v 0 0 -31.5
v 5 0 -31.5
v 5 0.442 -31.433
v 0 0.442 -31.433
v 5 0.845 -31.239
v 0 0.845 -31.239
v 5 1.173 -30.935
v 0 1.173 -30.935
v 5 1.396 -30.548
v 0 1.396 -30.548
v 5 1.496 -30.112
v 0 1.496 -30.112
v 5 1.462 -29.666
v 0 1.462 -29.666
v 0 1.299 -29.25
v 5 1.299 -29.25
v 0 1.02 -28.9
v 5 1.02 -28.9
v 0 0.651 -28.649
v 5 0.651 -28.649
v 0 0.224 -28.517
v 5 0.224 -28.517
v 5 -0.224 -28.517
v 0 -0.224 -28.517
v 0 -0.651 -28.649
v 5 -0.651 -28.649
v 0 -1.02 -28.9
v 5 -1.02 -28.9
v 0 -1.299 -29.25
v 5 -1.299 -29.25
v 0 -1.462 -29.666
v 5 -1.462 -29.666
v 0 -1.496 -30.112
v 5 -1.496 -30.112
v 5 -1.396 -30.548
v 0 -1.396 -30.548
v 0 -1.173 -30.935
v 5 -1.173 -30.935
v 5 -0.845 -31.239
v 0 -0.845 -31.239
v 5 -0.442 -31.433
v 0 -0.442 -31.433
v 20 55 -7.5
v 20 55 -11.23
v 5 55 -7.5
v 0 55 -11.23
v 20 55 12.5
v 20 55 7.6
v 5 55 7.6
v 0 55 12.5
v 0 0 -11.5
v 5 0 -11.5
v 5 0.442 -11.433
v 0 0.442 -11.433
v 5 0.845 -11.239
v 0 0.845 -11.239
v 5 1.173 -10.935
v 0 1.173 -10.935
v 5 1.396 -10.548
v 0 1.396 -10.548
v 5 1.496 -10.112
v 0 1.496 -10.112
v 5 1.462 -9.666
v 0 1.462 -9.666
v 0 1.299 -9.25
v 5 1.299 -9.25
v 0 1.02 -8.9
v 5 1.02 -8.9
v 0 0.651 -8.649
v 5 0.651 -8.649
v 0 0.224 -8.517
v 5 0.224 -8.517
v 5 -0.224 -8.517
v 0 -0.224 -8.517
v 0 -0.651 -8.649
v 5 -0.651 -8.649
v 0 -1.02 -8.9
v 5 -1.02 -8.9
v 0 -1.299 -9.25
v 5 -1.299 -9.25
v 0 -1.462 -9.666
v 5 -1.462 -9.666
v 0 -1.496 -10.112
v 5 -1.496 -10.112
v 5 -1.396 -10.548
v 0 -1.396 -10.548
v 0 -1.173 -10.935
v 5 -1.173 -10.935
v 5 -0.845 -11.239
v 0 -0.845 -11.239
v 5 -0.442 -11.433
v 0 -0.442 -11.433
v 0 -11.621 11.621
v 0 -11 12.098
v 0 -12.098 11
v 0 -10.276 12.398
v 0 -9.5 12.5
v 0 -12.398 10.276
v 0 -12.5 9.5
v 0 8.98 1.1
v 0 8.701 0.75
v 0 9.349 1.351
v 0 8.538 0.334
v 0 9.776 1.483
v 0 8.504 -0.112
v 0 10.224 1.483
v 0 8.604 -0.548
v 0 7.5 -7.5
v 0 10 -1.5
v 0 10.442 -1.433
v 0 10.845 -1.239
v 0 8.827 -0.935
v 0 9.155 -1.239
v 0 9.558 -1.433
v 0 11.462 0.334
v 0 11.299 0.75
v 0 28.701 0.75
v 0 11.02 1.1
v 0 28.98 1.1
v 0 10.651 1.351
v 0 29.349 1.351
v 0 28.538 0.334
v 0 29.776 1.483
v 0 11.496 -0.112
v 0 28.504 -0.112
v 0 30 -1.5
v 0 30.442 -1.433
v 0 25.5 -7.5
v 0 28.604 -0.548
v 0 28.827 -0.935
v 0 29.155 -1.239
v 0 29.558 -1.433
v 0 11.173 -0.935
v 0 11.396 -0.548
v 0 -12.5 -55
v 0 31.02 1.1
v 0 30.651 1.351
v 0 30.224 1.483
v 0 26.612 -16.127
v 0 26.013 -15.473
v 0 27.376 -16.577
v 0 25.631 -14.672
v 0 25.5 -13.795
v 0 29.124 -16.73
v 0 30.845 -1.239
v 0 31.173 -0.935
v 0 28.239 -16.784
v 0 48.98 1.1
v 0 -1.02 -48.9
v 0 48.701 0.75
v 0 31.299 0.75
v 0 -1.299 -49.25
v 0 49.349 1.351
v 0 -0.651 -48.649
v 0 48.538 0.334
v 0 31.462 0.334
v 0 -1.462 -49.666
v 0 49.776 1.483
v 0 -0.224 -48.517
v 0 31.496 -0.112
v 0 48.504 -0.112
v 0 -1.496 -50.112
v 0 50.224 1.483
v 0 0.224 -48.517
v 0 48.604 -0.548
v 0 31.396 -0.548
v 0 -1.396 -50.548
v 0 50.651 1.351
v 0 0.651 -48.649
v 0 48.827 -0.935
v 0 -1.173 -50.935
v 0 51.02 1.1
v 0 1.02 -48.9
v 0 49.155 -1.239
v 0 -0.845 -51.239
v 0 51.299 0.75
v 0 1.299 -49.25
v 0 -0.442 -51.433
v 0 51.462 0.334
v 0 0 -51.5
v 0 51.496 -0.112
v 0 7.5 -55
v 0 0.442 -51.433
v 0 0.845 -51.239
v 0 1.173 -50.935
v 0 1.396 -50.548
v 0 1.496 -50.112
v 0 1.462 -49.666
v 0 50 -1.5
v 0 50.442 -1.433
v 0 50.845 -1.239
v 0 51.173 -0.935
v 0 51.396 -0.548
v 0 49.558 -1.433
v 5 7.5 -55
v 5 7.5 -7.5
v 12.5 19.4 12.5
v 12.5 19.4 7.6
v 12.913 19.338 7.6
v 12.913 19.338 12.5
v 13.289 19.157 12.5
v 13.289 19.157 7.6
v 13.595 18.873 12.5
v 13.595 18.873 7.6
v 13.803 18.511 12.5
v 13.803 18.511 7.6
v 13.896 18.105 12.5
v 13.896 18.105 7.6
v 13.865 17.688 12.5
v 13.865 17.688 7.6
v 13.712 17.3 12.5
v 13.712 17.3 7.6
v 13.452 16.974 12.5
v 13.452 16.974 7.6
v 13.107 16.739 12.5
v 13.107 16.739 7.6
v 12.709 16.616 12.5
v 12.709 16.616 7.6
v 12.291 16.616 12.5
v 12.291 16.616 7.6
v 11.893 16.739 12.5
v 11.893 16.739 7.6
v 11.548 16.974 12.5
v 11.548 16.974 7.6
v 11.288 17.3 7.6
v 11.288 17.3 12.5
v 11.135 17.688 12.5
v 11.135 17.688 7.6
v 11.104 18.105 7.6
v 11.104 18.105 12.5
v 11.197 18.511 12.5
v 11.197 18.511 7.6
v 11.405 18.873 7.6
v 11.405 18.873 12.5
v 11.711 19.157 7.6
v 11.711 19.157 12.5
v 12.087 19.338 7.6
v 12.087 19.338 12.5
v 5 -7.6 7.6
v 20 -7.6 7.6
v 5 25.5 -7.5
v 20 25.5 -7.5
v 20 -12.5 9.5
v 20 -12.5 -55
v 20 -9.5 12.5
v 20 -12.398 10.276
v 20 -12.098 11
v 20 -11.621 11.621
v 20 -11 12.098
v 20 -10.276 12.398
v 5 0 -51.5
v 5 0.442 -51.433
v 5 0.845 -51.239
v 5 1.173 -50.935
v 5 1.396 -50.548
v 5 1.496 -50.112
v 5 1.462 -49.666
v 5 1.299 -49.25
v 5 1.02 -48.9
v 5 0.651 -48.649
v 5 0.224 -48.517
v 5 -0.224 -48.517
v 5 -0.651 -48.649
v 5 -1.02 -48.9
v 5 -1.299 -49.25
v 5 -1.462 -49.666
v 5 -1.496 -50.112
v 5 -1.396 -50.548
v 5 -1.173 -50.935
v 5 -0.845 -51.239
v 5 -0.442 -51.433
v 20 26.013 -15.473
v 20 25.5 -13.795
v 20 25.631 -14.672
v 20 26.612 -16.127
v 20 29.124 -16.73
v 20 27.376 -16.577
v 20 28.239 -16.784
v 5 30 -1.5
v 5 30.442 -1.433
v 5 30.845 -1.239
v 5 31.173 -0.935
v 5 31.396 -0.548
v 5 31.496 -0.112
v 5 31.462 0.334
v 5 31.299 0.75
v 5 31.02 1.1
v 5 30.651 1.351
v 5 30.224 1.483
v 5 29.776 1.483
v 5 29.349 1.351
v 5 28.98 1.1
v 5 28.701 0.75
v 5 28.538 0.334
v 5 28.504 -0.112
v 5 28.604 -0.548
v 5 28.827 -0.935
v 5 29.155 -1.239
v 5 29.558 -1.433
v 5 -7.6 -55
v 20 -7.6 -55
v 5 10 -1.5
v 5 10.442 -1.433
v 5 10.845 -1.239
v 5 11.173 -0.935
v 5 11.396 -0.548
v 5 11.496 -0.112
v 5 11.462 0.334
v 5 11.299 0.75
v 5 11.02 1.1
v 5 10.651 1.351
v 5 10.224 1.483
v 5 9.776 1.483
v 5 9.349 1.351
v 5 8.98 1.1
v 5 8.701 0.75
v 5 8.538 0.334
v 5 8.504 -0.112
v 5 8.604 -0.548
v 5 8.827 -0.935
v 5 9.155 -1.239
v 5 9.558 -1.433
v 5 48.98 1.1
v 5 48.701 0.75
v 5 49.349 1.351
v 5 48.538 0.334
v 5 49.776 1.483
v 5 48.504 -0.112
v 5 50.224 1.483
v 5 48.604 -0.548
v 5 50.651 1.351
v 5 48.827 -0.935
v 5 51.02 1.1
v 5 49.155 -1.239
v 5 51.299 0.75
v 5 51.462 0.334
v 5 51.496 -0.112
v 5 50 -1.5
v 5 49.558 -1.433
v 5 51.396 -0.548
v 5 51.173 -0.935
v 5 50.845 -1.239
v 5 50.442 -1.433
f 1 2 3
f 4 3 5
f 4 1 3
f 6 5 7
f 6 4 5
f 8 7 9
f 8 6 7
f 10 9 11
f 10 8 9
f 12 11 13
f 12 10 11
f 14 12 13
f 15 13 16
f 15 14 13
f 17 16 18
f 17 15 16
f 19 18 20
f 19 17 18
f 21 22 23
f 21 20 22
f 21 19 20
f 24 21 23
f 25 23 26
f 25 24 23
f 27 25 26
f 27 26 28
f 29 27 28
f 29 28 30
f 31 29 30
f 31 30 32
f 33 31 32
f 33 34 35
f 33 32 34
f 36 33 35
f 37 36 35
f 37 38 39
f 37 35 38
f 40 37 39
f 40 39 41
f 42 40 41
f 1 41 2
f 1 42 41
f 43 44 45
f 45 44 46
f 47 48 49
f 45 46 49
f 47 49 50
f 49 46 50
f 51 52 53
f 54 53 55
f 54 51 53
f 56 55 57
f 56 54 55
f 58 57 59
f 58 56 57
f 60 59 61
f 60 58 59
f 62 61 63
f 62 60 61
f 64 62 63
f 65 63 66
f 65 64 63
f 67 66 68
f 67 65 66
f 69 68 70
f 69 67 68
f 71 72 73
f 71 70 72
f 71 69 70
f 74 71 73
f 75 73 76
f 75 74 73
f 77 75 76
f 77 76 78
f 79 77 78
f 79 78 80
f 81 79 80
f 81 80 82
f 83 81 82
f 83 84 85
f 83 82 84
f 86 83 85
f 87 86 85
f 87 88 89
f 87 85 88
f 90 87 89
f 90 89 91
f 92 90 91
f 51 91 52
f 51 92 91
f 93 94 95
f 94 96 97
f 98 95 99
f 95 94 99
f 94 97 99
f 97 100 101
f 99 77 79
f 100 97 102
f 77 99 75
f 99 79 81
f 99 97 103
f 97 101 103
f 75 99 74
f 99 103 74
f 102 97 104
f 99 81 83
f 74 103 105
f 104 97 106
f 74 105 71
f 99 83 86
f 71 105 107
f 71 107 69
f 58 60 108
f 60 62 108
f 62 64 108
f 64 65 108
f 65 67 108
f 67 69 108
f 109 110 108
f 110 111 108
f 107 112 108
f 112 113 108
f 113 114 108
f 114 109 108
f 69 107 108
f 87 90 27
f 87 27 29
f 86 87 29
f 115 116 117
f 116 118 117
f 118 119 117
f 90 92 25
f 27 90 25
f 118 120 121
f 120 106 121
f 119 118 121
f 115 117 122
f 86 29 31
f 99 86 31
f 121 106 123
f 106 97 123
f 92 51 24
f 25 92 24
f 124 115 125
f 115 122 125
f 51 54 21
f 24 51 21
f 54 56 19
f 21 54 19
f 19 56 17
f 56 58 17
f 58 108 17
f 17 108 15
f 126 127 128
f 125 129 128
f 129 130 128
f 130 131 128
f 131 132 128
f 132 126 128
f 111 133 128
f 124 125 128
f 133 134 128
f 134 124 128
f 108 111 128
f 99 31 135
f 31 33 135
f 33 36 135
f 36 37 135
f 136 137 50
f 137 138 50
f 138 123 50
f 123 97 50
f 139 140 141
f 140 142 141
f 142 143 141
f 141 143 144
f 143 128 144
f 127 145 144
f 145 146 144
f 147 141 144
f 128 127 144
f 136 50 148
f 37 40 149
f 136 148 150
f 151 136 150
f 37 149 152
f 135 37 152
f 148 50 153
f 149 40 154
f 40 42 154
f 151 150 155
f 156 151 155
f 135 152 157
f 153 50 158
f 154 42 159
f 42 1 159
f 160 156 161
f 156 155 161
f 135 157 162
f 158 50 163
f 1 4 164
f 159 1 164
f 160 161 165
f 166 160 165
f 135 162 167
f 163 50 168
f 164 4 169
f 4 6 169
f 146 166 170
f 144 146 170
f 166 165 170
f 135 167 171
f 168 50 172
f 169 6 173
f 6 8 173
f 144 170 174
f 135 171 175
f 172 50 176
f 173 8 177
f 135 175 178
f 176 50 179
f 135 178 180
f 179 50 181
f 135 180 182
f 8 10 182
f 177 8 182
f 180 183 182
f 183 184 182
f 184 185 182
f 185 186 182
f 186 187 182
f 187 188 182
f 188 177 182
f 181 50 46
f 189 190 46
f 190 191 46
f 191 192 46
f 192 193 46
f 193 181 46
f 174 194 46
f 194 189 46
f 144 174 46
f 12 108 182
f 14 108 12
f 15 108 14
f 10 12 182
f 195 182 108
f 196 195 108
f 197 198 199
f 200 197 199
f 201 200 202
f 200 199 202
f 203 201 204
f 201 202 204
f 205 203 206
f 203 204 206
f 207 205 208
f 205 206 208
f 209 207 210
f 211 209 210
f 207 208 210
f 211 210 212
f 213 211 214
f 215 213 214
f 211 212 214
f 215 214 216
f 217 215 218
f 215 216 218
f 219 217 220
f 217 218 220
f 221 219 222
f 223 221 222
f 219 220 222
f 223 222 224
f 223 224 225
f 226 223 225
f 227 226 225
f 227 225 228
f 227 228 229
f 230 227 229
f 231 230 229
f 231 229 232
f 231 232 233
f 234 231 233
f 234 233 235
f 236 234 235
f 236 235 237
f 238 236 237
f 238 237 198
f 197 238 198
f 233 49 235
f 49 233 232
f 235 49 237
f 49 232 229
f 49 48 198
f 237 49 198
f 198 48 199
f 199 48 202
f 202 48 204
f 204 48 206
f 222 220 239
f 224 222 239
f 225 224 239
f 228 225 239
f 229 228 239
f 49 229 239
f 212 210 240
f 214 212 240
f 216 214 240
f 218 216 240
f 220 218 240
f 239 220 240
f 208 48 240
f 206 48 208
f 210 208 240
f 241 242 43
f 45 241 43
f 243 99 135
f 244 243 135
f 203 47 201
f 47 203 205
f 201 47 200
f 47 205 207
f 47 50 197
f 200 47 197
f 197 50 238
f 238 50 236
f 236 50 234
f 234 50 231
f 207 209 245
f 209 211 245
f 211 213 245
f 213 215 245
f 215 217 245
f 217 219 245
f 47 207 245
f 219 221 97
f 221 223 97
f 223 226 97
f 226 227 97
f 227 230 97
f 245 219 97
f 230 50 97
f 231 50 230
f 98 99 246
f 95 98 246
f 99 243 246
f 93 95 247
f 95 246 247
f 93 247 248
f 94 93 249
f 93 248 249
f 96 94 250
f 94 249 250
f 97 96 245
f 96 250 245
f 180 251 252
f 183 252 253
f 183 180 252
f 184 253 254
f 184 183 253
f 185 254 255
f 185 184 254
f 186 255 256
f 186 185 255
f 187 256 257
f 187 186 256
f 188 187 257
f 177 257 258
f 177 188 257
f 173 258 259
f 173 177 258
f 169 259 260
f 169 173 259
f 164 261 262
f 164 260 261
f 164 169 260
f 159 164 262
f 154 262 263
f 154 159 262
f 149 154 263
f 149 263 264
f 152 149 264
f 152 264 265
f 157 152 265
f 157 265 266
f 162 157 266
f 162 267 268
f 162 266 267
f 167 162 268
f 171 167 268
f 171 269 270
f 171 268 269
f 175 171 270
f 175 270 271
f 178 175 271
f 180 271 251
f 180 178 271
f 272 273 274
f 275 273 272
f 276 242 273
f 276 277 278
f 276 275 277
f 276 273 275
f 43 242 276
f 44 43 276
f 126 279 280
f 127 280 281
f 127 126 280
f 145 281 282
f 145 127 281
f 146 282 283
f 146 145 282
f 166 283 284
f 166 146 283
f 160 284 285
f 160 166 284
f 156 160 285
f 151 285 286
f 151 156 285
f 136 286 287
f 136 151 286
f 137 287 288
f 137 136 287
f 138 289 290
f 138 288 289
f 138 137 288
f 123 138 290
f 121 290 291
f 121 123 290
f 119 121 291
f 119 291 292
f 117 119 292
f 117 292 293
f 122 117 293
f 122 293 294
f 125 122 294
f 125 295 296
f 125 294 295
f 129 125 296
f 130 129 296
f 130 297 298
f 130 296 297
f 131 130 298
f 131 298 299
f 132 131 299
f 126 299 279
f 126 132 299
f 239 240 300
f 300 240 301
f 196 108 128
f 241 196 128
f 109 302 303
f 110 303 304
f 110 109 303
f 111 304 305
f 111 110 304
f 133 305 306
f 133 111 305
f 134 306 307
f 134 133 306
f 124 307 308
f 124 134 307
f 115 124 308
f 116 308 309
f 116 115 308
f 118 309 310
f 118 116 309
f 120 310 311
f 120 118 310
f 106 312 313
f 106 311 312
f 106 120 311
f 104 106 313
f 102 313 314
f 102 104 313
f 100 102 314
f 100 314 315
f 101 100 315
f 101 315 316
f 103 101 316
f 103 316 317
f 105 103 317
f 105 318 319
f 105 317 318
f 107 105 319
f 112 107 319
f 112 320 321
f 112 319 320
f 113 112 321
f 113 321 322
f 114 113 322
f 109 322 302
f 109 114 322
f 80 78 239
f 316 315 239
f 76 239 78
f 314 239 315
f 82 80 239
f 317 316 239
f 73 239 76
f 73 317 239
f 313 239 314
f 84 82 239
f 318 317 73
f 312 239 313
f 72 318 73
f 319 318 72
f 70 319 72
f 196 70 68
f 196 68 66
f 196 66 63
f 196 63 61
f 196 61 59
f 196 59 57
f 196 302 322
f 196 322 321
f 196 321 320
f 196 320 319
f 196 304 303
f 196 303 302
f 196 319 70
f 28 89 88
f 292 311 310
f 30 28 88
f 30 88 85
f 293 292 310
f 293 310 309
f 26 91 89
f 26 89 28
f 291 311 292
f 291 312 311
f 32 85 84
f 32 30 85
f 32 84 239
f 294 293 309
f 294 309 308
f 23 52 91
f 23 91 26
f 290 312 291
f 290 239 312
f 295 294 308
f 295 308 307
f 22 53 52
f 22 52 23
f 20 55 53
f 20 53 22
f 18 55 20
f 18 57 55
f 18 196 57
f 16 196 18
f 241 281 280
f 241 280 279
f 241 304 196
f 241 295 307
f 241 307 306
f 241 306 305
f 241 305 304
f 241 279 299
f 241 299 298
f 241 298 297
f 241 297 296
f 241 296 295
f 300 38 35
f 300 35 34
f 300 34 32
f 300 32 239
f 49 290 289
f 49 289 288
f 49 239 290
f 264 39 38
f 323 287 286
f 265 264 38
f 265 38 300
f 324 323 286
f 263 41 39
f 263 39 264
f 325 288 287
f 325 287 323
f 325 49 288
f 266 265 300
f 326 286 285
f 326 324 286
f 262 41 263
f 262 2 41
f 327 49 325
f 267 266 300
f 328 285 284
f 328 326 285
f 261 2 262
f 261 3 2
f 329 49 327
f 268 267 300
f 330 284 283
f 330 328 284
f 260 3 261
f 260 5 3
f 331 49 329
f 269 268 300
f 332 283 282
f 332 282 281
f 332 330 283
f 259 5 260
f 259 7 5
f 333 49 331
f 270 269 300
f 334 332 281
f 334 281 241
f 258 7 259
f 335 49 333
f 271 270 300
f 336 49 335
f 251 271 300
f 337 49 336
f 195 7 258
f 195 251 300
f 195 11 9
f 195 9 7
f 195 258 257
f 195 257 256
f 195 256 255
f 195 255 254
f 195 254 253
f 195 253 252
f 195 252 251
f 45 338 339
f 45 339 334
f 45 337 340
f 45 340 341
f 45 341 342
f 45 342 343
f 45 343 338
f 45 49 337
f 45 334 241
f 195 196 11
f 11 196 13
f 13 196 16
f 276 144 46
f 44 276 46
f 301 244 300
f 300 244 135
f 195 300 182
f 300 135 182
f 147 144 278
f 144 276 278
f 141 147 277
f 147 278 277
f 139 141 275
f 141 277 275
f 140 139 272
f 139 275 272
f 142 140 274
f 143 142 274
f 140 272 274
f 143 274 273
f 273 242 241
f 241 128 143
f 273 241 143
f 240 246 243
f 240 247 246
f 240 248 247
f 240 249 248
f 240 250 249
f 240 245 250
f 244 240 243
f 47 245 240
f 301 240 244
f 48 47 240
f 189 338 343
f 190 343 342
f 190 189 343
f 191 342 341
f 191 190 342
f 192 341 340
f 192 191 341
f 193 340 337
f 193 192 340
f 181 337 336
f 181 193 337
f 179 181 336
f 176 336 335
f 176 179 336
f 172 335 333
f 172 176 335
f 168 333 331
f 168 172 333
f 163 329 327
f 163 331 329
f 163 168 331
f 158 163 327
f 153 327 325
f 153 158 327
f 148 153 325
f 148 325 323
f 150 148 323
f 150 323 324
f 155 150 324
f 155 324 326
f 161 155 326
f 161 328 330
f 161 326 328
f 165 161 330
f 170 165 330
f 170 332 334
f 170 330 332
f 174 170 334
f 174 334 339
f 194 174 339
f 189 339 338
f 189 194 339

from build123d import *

# Parameters (mm, degrees)
SKETCH_1_R          = 1.5
EXTRUDE_1_DEPTH     = 20
CUT_EXTRUDE_1_DEPTH = 15
SKETCH_3_R          = 1.4
CUT_EXTRUDE_2_DEPTH = 86.695740851
FILLET_1_R          = 3


with BuildPart() as part:
    # 草图1 → 凸台-拉伸1 (new body)
    with BuildSketch(Plane(origin=(0, 0, 0), x_dir=(0, 0, -1), z_dir=(1, 0, 0))):
        Polygon((-12.5, -12.5), (55, -12.5), (55, 7.5), (7.5, 7.5), (7.5, 25.5), (17.5, 25.5), (11.229581431, 55), (-12.5, 55), align=None)
        with Locations((0, 10)):
            Circle(SKETCH_1_R, mode=Mode.SUBTRACT)
        with Locations((0, 30)):
            Circle(SKETCH_1_R, mode=Mode.SUBTRACT)
        with Locations((10, 0)):
            Circle(SKETCH_1_R, mode=Mode.SUBTRACT)
        with Locations((30, 0)):
            Circle(SKETCH_1_R, mode=Mode.SUBTRACT)
        with Locations((50, 0)):
            Circle(SKETCH_1_R, mode=Mode.SUBTRACT)
        with Locations((0, 50)):
            Circle(SKETCH_1_R, mode=Mode.SUBTRACT)
    extrude(amount=EXTRUDE_1_DEPTH)

    # 草图2 → 切除-拉伸1 (cut)
    with BuildSketch(Plane.ZY.offset(-20)):
        Polygon((7.6, 55), (7.6, -7.6), (-55, -7.6), (-55, 7.5), (-7.5, 7.5), (-7.5, 55), align=None)
    extrude(amount=CUT_EXTRUDE_1_DEPTH, mode=Mode.SUBTRACT)

    # 草图3 → 切除-拉伸2 (cut, through all)
    with BuildSketch(Plane(origin=(0, 0, 7.6), x_dir=(-1, 0, 0), z_dir=(0, 0, -1))):
        with Locations(Location((-12.5, 18, 0), (0, 0, 90))):
            Circle(SKETCH_3_R)
    extrude(amount=-CUT_EXTRUDE_2_DEPTH, mode=Mode.SUBTRACT)

    # 圆角1
    fillet_1_edges = [part.edges().sort_by_distance(p)[0] for p in [
        (10, -12.5, 12.5),
        (10, 25.5, -17.5),
    ]]
    fillet(fillet_1_edges, radius=FILLET_1_R)


solid = part.part
